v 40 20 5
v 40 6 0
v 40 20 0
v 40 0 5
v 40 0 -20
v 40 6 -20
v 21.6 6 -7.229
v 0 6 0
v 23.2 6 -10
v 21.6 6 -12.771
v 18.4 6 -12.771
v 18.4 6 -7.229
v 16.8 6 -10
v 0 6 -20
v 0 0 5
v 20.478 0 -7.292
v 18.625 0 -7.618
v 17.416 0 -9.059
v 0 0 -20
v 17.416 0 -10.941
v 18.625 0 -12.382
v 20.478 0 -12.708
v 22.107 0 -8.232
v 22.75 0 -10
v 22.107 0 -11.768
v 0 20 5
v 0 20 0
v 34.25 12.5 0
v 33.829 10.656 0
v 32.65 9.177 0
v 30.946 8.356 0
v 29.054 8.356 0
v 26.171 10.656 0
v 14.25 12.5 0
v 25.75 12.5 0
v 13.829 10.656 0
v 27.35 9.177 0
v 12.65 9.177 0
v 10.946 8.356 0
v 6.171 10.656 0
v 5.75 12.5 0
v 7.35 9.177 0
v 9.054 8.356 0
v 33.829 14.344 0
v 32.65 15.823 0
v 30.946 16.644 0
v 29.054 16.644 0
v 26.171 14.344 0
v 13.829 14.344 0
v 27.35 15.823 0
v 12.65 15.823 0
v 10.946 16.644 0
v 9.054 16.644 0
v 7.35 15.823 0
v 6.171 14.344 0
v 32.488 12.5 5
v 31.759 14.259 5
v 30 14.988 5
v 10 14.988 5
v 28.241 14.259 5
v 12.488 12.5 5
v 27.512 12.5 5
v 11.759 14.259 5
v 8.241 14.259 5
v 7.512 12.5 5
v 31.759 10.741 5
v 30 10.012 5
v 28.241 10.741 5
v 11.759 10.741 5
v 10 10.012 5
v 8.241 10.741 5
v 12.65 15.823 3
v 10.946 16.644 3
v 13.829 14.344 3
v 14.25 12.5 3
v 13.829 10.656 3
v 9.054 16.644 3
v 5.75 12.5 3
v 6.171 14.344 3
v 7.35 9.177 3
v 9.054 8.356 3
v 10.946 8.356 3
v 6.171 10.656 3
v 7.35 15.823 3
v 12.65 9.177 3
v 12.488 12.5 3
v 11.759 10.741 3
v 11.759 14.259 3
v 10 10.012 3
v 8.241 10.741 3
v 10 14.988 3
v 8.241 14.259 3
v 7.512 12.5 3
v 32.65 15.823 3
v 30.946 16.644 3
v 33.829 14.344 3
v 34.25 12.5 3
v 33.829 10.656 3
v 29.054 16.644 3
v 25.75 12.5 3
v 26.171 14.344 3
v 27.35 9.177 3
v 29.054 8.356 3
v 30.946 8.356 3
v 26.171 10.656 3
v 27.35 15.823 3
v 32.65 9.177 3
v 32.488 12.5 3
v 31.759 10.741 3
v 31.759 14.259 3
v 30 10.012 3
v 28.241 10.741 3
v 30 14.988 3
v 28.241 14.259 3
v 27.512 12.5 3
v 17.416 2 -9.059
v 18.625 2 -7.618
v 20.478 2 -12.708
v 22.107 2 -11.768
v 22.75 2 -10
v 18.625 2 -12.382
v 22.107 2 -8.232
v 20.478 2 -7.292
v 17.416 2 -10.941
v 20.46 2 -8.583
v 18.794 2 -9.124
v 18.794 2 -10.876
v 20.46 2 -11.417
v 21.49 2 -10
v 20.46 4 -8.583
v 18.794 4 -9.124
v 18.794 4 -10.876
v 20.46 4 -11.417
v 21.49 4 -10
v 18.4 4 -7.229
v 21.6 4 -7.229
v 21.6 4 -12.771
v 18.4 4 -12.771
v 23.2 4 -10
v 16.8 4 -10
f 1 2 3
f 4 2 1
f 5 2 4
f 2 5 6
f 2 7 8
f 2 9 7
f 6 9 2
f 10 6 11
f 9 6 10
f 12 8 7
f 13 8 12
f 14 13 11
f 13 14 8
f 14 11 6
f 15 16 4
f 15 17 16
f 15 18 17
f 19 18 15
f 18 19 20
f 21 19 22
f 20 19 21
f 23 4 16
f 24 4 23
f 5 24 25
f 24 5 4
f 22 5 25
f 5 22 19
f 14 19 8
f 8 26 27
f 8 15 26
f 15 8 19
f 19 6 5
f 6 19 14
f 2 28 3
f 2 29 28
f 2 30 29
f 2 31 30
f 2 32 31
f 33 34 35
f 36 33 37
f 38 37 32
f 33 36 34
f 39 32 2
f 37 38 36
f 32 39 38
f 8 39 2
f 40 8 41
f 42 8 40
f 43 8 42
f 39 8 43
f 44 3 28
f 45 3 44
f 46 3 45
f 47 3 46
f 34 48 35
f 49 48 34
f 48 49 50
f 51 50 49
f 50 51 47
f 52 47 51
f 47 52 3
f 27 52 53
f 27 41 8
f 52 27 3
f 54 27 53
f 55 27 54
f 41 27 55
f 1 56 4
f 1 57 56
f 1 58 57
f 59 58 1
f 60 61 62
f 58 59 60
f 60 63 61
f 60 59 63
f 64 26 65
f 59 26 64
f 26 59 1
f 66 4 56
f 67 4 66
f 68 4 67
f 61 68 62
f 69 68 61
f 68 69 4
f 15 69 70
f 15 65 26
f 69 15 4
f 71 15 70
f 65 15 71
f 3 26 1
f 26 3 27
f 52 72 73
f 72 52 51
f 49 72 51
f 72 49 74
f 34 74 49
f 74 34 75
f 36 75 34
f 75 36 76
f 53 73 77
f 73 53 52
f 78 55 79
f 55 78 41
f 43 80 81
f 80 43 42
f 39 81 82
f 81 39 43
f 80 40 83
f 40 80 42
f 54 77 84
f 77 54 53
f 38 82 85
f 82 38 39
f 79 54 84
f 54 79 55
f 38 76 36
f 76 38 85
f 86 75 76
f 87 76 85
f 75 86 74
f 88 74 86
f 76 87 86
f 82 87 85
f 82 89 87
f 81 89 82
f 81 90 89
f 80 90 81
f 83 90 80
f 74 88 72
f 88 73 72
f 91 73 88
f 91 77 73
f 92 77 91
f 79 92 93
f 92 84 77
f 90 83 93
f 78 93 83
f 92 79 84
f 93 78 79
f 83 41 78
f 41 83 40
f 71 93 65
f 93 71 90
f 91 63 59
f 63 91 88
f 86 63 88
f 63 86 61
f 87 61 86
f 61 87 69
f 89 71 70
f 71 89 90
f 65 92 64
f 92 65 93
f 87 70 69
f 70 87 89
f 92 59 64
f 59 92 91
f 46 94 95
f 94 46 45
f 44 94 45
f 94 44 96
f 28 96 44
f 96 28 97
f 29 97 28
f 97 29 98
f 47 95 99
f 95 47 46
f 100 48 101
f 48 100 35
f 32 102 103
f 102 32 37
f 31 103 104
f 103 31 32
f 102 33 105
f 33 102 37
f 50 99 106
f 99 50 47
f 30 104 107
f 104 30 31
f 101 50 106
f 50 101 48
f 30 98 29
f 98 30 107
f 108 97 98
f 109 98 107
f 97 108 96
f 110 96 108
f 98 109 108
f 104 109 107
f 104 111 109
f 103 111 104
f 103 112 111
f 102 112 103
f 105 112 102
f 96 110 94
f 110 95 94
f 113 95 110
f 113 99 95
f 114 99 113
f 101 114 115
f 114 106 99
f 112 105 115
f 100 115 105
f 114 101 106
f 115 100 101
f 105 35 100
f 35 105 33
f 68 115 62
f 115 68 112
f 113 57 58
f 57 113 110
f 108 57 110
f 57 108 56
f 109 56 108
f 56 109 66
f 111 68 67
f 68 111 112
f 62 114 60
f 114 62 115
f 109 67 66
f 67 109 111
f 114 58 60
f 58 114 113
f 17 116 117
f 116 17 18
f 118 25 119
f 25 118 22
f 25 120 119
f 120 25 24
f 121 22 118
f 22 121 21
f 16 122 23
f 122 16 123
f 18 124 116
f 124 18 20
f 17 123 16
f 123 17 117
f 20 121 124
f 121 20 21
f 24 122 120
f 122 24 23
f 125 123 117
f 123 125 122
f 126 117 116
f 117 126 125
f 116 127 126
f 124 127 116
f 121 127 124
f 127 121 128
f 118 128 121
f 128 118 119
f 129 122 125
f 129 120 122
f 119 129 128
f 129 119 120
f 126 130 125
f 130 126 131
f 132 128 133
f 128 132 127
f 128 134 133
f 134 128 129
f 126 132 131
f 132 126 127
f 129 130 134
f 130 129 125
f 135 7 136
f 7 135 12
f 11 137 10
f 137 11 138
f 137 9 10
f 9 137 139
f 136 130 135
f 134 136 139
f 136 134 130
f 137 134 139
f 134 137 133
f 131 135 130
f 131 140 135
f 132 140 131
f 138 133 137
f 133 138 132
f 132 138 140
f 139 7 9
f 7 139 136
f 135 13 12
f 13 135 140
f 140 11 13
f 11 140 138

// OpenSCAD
include <MCAD/units.scad>;
include <MCAD/materials.scad>
include <MCAD/boxes.scad>;
use <MCAD/shapes.scad>;
use <MCAD/nuts_and_bolts.scad>;


module gb_body()
{
    cube([40,20,6]);
    rotate([90,0,0]) cube([40,20,5]);
    %translate([10,-3,12.5]) rotate([90,0,0]) boltHole(5, length=12);
    %translate([30,-3,12.5]) rotate([90,0,0]) boltHole(5, length=12);
    %translate([20,10,2]) rotate([0,0,0]) boltHole(3, length=12);
    %translate([20,10,4]) rotate([0,0,0]) nutHole(3);
}

module gb_cuts()
{
    translate([10,-3,12.5]) rotate([90,0,0]) boltHole(5, length=12);
    translate([30,-3,12.5]) rotate([90,0,0]) boltHole(5, length=12);
    translate([20,10,2]) rotate([0,0,0]) boltHole(3, length=12);
    translate([20,10,4]) rotate([0,0,0]) nutHole(3);
}



module gb()
{
    difference(){
        gb_body();
        gb_cuts();
    }
    
}

rotate([270,0,0]) gb();
